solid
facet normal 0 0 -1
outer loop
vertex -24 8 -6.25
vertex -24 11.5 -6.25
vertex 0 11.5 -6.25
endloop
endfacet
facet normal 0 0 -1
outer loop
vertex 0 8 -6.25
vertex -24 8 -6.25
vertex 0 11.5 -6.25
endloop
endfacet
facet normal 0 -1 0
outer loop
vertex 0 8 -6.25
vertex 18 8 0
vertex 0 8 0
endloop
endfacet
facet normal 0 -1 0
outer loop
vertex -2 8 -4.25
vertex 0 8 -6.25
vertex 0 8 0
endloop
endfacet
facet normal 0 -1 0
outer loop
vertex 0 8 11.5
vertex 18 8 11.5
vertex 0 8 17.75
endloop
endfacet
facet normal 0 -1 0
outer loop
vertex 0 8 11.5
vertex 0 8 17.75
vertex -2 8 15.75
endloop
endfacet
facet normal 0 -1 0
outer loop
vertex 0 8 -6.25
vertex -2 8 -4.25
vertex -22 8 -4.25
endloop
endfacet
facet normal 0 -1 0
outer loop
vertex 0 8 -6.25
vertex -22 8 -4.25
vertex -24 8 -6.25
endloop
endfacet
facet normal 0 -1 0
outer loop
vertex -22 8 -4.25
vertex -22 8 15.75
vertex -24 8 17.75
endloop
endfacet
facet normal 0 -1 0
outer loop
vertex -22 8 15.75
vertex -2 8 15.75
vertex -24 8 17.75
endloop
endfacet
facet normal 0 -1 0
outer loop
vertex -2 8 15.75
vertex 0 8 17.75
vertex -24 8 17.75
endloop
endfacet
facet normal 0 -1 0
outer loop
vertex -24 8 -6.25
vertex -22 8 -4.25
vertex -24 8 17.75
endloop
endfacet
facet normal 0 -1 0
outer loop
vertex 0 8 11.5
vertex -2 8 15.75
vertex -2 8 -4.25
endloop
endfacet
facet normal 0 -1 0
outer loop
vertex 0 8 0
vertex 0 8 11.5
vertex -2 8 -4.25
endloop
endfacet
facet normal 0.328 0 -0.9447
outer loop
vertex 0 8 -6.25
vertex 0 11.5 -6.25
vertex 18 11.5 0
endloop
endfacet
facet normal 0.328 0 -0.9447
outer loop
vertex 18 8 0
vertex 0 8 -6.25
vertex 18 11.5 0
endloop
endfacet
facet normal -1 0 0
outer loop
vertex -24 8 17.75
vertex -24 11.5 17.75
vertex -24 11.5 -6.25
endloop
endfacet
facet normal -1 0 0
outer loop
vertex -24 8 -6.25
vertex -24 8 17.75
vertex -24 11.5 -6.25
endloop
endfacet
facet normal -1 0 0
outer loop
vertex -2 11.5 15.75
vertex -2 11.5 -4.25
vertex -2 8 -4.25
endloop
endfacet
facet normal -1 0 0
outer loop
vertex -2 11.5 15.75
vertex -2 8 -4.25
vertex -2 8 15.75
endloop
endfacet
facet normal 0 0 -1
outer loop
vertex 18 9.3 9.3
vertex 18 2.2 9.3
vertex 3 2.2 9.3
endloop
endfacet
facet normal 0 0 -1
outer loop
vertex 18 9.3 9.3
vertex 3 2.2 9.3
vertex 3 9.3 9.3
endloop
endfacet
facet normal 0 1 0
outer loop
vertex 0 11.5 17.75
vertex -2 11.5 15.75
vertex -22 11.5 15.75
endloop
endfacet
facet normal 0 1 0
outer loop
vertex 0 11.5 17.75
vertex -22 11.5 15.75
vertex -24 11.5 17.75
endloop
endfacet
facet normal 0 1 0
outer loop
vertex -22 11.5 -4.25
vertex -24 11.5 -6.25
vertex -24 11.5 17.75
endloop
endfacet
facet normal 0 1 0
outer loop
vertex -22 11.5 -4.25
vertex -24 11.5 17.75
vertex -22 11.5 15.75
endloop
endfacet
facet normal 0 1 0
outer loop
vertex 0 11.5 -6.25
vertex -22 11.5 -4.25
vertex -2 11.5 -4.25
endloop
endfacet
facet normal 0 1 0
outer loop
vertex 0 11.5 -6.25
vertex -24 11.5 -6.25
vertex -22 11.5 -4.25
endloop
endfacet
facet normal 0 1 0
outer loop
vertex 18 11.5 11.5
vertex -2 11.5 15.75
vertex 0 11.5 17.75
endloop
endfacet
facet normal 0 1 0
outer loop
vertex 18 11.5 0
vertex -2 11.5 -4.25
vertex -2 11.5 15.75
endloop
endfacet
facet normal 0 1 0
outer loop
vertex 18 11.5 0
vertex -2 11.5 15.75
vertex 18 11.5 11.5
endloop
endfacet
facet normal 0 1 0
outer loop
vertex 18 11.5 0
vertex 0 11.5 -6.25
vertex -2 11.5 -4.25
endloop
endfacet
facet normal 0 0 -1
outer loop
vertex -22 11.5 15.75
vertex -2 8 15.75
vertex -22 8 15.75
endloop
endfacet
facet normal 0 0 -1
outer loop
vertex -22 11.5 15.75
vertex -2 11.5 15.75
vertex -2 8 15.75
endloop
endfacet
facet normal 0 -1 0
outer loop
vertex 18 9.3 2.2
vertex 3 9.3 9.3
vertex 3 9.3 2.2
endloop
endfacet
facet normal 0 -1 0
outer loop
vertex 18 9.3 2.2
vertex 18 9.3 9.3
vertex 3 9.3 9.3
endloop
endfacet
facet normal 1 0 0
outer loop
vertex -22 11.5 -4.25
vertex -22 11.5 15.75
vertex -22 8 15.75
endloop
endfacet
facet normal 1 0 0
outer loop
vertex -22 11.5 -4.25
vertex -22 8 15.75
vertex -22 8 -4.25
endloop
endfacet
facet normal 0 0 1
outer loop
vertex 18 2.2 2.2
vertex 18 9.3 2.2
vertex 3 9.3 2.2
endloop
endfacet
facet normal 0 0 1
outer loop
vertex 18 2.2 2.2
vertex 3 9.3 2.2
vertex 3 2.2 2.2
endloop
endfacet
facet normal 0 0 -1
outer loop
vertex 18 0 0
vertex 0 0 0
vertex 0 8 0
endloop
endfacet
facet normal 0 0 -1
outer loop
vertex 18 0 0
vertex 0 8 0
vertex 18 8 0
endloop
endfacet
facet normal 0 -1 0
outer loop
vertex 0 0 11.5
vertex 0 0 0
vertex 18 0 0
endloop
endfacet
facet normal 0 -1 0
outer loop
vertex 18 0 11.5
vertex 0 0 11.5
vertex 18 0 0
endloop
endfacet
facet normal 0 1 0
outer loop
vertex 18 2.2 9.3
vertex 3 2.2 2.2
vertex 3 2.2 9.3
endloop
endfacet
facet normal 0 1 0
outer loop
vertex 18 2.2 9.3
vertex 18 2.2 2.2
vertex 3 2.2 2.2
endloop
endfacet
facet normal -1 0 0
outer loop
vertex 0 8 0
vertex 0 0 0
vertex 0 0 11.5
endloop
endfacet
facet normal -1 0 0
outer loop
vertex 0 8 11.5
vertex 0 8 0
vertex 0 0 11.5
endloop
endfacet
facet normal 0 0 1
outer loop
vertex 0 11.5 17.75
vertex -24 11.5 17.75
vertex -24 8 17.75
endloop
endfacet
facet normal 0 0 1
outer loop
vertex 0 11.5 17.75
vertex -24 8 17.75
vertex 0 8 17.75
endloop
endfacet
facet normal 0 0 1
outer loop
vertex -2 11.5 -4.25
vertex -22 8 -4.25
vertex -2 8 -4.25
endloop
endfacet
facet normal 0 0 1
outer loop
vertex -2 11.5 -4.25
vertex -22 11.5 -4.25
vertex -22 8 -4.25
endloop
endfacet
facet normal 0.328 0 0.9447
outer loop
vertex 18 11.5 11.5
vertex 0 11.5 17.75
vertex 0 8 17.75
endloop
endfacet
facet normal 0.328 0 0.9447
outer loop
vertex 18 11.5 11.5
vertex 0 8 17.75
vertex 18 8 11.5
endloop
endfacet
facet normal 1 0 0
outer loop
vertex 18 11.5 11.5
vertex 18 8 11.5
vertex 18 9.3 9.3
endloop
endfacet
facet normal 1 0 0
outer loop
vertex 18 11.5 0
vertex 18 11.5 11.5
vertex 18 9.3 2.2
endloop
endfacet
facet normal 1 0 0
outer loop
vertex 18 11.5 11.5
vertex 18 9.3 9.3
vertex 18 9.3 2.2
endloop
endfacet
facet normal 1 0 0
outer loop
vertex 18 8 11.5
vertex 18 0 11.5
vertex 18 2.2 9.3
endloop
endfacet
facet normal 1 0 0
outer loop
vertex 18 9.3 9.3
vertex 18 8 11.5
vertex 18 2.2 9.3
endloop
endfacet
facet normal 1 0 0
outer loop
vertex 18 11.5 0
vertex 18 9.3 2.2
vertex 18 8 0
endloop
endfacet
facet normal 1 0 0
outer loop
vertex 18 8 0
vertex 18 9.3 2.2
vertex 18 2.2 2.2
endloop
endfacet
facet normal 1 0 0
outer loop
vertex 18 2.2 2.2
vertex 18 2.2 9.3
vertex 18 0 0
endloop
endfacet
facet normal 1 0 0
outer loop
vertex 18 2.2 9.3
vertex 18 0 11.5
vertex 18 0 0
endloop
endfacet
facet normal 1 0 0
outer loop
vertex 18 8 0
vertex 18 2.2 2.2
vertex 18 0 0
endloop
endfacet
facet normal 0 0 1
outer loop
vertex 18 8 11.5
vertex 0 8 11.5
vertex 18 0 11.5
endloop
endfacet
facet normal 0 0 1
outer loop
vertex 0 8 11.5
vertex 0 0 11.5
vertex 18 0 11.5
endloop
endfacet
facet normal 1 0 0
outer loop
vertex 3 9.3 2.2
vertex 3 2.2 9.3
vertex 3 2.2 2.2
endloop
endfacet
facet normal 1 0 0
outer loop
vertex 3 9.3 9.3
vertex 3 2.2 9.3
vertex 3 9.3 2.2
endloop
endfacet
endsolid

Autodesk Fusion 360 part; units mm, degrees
sketch "Sketch1" plane through (0, 0, 0) normal (0, 1, 0) x (1, 0, 0)
  line L0 (0, 0) -> (0, -11.5)
  line L1 (0, -11.5) -> (18, -11.5)
  line L2 (0, 0) -> (18, 0)
  line L3 (18, -11.5) -> (18, 0)
  dimension "d1" = 11.5
  dimension "d2" = 18
  dimension "d3" = 18
extrude "Extrude1" add sketch "Sketch1" along normal blind 11.5
sketch "Sketch2" plane through (18, 0, 0) normal (1, 0, 0) x (0, 1, 0)
  line L0 (0, 11.5) -> (0, 0)
  line L1 (0, 0) -> (11.5, 0)
  line L2 (11.5, 0) -> (11.5, 11.5)
  line L3 (11.5, 11.5) -> (0, 11.5)
  line L4 (0, 11.5) -> (0, 9.3)
  line L5 (0, 9.3) -> (2.2, 9.3)
  line L6 (2.2, 9.3) -> (9.3, 9.3)
  line L7 (9.3, 9.3) -> (9.3, 2.2)
  line L8 (9.3, 2.2) -> (2.2, 2.2)
  line L9 (2.2, 2.2) -> (2.2, 9.3)
  dimension "d9" = 2.2
  dimension "d10" = 2.2
  dimension "d11" = 7.1
  dimension "d12" = 7.1
extrude "Extrude2" cut sketch "Sketch2" against normal blind 15 contours L6 L7 L8 L9
sketch "Sketch3" plane through (0, 0, 0) normal (-1, 0, 0) x (0, -1, 0)
  line L0 (0, 0) -> (0, 11.5)
  line L1 (0, 11.5) -> (-11.5, 11.5)
  line L2 (-11.5, 11.5) -> (-11.5, 0)
  line L3 (-11.5, 0) -> (0, 0)
  line L4 (-11.5, 11.5) -> (-7.25, 11.5)
  line L5 (-7.25, 11.5) -> (-7.25, 7.25)
  line L6 (-7.25, 7.25) -> (-4.25, 7.25)
  line L7 (-4.25, 7.25) -> (-4.25, 4.25)
  line L8 (-4.25, 4.25) -> (-7.25, 4.25)
  line L9 (-7.25, 4.25) -> (-7.25, 7.25)
  dimension "d15" = 4.25
  dimension "d16" = 4.25
  dimension "d17" = 3
  dimension "d18" = 3
sketch "Sketch4" plane through (0, 0, 0) normal (-1, 0, 0) x (0, -1, 0)
  line L0 (0, 0) -> (0, 11.5)
  line L1 (0, 11.5) -> (-11.5, 11.5)
  line L2 (-11.5, 11.5) -> (-11.5, 0)
  line L3 (-11.5, 0) -> (0, 0)
  line L4 (-11.5, 11.5) -> (-11.5, 7.5)
  line L5 (-11.5, 7.5) -> (0, 7.5)
  line L6 (0, 7.5) -> (0, 4)
  line L7 (0, 4) -> (-11.5, 4)
  line L8 (-11.5, 4) -> (-11.5, 7.5)
  dimension "d21" = 4
  dimension "d22" = 3.5
sketch "Sketch5" plane through (0, 0, 0) normal (0, -1, 0) x (1, 0, 0)
  line L0 (0, 11.5) -> (0, 0)
  line L1 (0, 0) -> (18, 0)
  line L2 (18, 0) -> (18, 11.5)
  line L3 (18, 11.5) -> (0, 11.5)
  line L4 (0, 11.5) -> (0, 0)
sketch "Sketch6" plane through (0, 11.5, 0) normal (0, 1, 0) x (-1, 0, 0)
  line L0 (0, 0) -> (0, 11.5)
  line L1 (0, 11.5) -> (-18, 11.5)
  line L2 (-18, 11.5) -> (-18, 0)
  line L3 (-18, 0) -> (0, 0)
  line L4 (0, 5.75) -> (24, 5.75)
  line L5 (24, 5.75) -> (24, 17.75)
  line L6 (24, 17.75) -> (0, 17.75)
  line L7 (0, 17.75) -> (0, 5.75)
  line L8 (0, 5.75) -> (-18, 5.75) construction
  line L9 (24, 5.75) -> (24, -6.25)
  line L10 (24, -6.25) -> (0, -6.25)
  line L11 (0, 5.75) -> (24, 5.75)
  line L12 (0, -6.25) -> (0, 0)
  dimension "d26" = 24
  dimension "d27" = 12
extrude "Extrude5" add sketch "Sketch6" against normal blind 3.5 contours L0 L4 L9 L10 L11 L12 | L0 L4 L5 L6 L7 L11
sketch "Sketch7" plane through (0, 11.5, 0) normal (0, 1, 0) x (-1, 0, 0)
  line L0 (0, 11.5) -> (-18, 11.5)
  line L1 (-18, 11.5) -> (-18, 0)
  line L2 (-18, 0) -> (0, 0)
  line L3 (0, 0) -> (0, -6.25)
  line L4 (0, -6.25) -> (24, -6.25)
  line L5 (24, -6.25) -> (24, 17.75)
  line L6 (24, 17.75) -> (0, 17.75)
  line L7 (0, 17.75) -> (0, 11.5)
  line L8 (24, -6.25) -> (24, -4.25)
  line L9 (24, -4.25) -> (22, -4.25)
  line L10 (22, -4.25) -> (2, -4.25)
  line L11 (2, -4.25) -> (2, 15.75)
  line L12 (2, 15.75) -> (22, 15.75)
  line L13 (22, 15.75) -> (22, -4.25)
  dimension "d30" = 2
  dimension "d31" = 2
  dimension "d32" = 20
  dimension "d33" = 20
extrude "Extrude6" cut sketch "Sketch7" against normal blind 5 contours L10 L11 L12 L13
sketch "Sketch8" plane through (0, 0, 0) normal (1, 0, 0) x (0, 1, 0)
sketch "Sketch9" plane through (0, 11.5, 0) normal (0, 1, 0) x (-1, 0, 0)
  line L0 (2, -4.25) -> (2, 15.75)
  line L1 (2, 15.75) -> (22, 15.75)
  line L2 (22, 15.75) -> (22, -4.25)
  line L3 (22, -4.25) -> (2, -4.25)
  line L4 (0, 11.5) -> (-18, 11.5)
  line L5 (-18, 11.5) -> (-18, 0)
  line L6 (-18, 0) -> (0, 0)
  line L7 (0, 0) -> (0, -6.25)
  line L8 (0, -6.25) -> (24, -6.25)
  line L9 (24, -6.25) -> (24, 17.75)
  line L10 (24, 17.75) -> (0, 17.75)
  line L11 (0, 17.75) -> (0, 11.5)
  line L12 (0, -6.25) -> (-18, 0)
  line L13 (0, 17.75) -> (-18, 11.5)
extrude "Extrude7" add sketch "Sketch9" against normal blind 3.5 contours L4 L11 L13 | L6 L7 L12
